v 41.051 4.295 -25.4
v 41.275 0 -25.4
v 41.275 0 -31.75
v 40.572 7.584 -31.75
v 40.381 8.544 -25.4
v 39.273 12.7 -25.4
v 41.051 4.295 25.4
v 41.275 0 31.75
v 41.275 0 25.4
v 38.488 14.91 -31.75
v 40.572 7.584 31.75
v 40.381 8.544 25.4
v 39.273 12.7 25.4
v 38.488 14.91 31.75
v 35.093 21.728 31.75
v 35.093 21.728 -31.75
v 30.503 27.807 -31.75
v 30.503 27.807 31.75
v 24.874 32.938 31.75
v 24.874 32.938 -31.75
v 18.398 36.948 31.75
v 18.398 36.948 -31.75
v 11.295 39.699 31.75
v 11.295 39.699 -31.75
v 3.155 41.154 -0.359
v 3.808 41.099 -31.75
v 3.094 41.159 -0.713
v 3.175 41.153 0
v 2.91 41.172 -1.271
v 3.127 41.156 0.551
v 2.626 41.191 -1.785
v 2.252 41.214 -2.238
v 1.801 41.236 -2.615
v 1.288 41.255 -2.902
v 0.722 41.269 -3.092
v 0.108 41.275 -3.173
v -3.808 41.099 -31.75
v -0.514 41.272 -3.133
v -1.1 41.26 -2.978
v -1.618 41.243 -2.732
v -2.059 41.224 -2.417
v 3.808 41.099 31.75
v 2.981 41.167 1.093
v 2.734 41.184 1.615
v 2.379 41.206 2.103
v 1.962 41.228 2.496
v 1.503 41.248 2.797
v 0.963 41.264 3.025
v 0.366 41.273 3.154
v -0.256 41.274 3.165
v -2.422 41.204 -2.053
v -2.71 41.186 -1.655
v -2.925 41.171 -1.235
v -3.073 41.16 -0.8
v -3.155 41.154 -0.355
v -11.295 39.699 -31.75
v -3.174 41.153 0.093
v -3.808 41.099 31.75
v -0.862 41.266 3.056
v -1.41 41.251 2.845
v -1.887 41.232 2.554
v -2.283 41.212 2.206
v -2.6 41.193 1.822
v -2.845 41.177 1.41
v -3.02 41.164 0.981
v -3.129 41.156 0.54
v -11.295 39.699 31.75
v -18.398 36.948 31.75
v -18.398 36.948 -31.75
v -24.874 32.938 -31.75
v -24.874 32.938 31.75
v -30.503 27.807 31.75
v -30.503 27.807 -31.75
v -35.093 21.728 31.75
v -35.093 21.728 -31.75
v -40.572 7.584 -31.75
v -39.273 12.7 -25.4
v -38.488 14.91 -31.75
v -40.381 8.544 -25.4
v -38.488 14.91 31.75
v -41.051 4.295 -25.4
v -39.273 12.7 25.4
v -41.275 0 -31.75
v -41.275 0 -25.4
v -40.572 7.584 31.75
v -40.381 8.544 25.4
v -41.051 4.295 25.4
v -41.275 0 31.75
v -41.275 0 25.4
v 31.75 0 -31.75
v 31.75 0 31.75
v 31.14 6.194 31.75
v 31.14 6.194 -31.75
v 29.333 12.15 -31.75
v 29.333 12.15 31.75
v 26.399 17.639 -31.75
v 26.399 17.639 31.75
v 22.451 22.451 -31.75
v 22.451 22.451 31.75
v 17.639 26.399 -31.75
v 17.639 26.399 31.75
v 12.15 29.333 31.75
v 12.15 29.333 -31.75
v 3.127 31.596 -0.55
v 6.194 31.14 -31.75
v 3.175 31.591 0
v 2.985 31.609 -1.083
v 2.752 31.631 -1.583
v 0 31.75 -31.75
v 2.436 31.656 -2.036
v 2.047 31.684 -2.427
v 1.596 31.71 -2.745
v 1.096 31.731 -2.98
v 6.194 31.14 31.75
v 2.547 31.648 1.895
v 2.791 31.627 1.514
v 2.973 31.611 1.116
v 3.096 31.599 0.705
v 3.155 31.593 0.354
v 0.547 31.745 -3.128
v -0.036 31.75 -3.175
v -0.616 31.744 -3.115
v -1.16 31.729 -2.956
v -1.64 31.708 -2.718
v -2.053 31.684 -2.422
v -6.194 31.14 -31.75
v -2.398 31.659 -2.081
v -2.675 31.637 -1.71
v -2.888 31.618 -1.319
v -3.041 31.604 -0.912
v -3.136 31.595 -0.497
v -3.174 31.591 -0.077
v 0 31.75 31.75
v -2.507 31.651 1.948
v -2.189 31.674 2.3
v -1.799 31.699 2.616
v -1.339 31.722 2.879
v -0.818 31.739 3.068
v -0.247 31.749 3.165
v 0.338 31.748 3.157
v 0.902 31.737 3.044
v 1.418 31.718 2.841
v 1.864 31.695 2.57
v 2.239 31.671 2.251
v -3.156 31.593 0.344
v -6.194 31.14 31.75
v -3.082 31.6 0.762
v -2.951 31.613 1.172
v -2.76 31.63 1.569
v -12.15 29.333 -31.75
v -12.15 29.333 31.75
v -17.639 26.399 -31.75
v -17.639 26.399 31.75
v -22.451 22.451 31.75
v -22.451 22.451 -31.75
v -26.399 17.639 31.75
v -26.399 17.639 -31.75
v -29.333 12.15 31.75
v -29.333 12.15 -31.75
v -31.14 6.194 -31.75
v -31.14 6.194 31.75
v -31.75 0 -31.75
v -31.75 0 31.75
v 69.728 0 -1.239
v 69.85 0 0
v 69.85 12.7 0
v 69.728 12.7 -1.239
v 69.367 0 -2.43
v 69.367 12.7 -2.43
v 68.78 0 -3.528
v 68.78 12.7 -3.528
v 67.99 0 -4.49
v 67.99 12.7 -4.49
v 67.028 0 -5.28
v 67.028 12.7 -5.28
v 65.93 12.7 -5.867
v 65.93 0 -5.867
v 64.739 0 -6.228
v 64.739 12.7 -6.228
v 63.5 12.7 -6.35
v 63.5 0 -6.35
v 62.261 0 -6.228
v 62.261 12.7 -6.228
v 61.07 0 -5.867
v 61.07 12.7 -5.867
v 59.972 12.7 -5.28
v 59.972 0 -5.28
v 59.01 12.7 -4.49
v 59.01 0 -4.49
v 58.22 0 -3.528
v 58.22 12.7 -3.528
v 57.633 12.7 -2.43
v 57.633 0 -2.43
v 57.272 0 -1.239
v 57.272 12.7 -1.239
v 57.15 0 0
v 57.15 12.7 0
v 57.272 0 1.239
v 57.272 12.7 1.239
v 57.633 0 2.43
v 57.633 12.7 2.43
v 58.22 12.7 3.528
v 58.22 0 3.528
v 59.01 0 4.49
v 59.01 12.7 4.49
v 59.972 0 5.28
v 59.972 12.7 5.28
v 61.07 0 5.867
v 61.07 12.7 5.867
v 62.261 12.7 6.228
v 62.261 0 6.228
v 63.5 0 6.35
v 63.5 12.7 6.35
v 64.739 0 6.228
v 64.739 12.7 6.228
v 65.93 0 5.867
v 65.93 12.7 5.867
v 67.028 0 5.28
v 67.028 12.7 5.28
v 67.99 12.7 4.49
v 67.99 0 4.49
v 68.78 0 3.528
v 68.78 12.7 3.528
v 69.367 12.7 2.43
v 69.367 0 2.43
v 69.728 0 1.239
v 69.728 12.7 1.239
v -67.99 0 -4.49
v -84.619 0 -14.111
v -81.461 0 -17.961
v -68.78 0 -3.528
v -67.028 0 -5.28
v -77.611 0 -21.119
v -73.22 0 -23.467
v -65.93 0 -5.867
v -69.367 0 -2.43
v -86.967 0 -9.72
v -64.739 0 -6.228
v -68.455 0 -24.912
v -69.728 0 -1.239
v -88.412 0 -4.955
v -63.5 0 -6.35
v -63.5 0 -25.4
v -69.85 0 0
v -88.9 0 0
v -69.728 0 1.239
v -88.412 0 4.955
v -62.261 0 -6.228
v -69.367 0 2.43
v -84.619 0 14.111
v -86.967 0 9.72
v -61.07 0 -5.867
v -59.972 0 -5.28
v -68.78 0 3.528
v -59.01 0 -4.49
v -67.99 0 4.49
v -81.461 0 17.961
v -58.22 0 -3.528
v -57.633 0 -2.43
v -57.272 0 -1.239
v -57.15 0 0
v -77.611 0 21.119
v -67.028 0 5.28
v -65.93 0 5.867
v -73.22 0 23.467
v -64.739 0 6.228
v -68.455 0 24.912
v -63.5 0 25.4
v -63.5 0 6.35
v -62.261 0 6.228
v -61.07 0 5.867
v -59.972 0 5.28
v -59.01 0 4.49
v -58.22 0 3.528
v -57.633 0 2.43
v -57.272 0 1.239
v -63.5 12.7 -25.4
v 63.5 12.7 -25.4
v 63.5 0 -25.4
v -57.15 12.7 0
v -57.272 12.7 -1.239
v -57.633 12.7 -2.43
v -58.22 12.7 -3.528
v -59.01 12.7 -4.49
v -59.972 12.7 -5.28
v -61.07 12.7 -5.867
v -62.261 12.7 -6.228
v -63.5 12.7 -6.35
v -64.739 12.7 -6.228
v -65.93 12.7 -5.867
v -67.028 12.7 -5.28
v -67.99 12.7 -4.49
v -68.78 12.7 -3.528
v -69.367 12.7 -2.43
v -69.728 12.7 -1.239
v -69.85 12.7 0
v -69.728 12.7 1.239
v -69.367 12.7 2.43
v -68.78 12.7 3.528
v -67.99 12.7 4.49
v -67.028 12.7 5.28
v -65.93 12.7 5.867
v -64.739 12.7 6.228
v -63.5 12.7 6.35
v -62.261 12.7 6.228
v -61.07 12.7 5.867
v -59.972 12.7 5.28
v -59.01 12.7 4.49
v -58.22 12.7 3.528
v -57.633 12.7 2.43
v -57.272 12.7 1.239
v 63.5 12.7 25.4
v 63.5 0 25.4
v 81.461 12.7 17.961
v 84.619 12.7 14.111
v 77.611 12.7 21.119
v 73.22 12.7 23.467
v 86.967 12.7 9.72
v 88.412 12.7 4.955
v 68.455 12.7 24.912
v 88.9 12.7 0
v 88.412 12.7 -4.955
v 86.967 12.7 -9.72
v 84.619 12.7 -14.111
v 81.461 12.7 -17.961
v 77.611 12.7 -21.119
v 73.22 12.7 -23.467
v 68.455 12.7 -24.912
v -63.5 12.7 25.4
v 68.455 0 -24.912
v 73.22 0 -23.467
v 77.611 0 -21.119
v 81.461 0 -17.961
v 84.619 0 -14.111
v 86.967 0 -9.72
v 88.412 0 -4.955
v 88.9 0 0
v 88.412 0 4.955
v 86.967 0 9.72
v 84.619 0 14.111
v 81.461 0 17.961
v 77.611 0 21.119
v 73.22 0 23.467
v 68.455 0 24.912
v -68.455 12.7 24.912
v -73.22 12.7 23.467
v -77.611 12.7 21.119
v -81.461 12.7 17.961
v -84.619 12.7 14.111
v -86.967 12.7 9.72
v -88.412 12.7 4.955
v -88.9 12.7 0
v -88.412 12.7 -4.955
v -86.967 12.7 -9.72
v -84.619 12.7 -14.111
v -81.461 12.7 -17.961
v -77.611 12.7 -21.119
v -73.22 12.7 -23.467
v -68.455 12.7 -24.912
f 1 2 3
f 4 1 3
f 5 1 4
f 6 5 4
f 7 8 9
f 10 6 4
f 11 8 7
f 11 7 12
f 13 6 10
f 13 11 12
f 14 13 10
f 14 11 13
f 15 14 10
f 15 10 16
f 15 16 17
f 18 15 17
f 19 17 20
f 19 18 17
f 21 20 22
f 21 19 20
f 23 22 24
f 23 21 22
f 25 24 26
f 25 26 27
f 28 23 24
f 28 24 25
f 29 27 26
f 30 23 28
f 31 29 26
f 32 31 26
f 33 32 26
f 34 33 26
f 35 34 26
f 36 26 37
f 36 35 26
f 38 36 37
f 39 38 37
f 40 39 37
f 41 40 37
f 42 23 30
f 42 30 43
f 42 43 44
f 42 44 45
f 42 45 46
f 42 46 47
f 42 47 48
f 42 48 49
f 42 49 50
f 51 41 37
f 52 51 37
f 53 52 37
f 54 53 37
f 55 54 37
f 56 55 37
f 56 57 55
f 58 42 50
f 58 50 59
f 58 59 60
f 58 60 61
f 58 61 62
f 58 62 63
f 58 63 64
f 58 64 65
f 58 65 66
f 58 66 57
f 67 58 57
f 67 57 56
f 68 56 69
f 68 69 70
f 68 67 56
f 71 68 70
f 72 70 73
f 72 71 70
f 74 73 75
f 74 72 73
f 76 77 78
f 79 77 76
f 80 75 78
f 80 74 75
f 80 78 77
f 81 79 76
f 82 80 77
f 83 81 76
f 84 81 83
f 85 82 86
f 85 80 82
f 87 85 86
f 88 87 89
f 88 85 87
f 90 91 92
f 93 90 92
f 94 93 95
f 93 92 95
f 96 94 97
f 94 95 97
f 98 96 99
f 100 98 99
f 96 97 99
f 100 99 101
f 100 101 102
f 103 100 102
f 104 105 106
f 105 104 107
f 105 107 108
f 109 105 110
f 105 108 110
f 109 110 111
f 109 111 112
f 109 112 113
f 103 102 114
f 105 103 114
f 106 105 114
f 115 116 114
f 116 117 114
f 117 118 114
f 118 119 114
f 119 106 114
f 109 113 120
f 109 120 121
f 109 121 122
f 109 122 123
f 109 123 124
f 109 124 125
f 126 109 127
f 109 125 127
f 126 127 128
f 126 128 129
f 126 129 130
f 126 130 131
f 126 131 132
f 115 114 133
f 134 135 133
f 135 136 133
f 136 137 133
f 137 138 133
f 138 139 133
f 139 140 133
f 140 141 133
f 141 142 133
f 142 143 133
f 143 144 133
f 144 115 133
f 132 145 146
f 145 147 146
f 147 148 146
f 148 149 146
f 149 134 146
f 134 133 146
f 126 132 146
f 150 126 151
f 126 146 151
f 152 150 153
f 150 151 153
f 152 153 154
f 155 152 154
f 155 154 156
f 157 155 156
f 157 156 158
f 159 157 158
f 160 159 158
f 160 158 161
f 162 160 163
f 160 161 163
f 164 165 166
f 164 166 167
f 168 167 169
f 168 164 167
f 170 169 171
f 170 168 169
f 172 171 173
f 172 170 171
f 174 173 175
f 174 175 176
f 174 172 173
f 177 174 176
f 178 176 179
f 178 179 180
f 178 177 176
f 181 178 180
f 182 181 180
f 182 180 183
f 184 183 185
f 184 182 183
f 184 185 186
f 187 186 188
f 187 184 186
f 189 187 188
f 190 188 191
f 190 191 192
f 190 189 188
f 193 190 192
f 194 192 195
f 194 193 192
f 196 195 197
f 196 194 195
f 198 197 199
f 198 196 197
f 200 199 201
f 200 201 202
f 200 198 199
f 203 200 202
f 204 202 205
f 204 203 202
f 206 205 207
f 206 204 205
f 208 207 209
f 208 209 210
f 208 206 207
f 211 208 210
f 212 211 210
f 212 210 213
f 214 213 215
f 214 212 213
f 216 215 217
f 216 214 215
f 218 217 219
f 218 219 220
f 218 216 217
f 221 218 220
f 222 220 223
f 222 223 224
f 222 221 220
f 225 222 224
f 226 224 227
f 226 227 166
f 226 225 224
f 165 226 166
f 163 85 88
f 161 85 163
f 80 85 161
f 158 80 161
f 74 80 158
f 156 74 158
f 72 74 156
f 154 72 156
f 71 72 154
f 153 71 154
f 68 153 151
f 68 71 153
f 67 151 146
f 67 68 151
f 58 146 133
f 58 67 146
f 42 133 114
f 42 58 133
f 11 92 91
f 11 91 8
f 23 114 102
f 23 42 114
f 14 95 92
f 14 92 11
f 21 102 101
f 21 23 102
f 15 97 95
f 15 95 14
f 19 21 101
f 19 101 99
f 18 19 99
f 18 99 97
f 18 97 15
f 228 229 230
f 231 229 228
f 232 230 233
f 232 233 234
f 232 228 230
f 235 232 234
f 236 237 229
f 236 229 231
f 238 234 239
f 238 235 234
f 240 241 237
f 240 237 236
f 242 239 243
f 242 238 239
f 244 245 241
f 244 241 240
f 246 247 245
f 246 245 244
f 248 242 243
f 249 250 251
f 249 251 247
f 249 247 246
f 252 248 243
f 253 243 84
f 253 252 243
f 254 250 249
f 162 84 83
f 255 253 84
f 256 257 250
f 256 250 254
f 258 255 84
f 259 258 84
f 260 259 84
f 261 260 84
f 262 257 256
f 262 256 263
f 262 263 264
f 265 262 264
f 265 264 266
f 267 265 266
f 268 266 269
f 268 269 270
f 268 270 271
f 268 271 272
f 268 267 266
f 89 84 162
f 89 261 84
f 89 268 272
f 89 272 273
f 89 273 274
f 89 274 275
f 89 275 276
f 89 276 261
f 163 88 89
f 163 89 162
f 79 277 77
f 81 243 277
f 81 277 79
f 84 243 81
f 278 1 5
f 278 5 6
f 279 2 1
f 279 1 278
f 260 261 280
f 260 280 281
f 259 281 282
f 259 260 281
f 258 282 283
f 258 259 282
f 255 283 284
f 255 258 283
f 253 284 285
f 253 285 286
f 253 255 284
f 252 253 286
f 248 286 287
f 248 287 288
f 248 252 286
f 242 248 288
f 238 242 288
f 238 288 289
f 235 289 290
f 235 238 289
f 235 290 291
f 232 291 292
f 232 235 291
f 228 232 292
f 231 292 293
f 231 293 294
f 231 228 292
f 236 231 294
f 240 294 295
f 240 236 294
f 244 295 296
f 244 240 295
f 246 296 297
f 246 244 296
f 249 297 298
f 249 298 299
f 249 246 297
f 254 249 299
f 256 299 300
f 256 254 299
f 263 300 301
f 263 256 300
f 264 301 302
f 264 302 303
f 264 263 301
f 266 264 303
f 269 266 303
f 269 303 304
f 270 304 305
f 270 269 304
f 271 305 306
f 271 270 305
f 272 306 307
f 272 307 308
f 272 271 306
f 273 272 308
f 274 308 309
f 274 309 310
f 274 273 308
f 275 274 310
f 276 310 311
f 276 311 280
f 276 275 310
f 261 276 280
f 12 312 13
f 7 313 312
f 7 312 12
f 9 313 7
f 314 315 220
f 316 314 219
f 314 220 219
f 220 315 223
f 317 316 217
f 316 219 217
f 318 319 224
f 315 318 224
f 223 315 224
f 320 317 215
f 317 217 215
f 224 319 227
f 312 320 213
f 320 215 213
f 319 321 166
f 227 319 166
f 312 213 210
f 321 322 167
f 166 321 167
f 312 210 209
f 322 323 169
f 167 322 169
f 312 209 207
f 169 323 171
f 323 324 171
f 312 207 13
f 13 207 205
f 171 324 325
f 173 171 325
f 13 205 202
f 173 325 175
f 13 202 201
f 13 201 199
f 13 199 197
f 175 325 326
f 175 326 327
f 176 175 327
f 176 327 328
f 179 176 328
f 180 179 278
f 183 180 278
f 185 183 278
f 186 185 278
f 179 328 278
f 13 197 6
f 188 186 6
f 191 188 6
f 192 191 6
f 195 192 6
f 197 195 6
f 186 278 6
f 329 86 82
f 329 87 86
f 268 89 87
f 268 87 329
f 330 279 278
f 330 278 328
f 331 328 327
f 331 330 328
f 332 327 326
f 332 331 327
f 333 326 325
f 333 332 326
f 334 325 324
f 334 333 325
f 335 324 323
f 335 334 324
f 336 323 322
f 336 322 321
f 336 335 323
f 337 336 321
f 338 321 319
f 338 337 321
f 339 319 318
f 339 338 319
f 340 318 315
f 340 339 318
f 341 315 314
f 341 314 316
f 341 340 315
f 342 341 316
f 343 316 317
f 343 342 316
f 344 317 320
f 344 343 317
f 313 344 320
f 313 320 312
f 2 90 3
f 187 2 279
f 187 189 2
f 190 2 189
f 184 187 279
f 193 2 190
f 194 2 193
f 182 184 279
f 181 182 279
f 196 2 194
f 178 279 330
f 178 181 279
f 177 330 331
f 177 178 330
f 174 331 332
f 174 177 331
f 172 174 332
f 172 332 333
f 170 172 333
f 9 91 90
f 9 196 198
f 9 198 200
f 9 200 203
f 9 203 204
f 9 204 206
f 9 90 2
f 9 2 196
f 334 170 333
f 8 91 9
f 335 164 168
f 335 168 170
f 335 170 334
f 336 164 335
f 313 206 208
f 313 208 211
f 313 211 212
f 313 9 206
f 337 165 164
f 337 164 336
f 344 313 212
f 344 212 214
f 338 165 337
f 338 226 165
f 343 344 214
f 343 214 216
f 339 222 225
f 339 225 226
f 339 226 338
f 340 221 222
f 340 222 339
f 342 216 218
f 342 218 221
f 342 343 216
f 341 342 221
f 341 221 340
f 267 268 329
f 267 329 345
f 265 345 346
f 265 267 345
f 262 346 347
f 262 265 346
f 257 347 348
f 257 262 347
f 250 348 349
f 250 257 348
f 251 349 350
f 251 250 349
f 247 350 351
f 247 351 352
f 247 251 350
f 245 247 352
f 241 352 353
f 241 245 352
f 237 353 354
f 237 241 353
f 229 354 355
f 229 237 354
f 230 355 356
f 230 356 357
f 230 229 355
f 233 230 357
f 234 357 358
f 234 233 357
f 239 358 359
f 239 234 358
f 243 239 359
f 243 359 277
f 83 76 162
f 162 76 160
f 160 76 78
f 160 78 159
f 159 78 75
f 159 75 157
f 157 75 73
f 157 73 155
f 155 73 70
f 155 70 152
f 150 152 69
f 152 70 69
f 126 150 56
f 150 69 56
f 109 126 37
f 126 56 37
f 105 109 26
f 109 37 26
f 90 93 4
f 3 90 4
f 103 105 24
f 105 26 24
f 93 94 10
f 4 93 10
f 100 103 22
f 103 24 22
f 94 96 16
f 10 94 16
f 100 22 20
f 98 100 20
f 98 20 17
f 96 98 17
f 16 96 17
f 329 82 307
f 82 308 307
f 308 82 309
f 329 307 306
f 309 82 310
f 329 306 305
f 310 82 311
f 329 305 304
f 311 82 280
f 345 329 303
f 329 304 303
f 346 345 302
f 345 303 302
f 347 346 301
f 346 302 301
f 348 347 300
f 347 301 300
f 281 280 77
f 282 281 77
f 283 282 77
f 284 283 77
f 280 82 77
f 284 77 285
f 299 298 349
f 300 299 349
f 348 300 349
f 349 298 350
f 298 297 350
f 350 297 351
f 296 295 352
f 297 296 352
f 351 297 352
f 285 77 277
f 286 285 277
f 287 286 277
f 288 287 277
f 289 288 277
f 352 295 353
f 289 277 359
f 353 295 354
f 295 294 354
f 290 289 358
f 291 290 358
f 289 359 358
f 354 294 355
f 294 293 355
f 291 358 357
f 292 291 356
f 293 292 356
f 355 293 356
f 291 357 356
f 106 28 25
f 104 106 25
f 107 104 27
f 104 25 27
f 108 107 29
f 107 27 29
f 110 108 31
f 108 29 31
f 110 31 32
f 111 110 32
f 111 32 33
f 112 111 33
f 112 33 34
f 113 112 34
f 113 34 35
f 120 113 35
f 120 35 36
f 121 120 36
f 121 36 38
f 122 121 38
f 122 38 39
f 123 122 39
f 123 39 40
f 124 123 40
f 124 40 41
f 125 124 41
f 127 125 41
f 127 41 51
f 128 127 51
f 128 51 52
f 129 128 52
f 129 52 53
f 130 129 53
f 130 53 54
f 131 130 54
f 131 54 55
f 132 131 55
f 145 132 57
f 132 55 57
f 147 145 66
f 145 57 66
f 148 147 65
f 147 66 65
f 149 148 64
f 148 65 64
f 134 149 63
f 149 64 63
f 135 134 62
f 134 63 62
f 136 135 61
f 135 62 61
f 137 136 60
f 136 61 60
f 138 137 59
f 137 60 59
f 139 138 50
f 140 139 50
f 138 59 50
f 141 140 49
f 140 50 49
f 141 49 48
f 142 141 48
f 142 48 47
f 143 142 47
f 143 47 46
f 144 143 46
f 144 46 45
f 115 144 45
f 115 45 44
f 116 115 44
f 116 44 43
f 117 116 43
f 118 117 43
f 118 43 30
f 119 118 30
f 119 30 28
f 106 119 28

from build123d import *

# Parameters (mm, degrees)
SKETCH5_R           = 6.35
BOSS_EXTRUDE2_DEPTH = 12.7
BOSS_EXTRUDE3_DEPTH = 31.75
CUT_EXTRUDE1_DEPTH  = 63.5
SKETCH10_R          = 3.175
CUT_EXTRUDE2_DEPTH  = 63.5


with BuildPart() as part:
    # Sketch5 → Boss-Extrude2 (new body)
    with BuildSketch(Plane(origin=(0, 0, 0), x_dir=(1, 0, 0), z_dir=(0, 1, 0))):
        with BuildLine():
            Line((-63.5, 25.4), (63.5, 25.4))
            ThreePointArc((63.5, 25.4), (88.9, 0), (63.5, -25.4))
            Line((63.5, -25.4), (-63.5, -25.4))
            ThreePointArc((-63.5, -25.4), (-88.9, 0), (-63.5, 25.4))
        make_face()
        with Locations((-63.5, 0)):
            Circle(SKETCH5_R, mode=Mode.SUBTRACT)
        with Locations((63.5, 0)):
            Circle(SKETCH5_R, mode=Mode.SUBTRACT)
    extrude(amount=BOSS_EXTRUDE2_DEPTH)

    # Sketch6 → Boss-Extrude3 (add, symmetric)
    with BuildSketch(Plane.XY):
        with BuildLine():
            Line((-41.275, 0), (41.275, 0))
            ThreePointArc((41.275, 0), (0, 41.275), (-41.275, 0))
        make_face()
    extrude(amount=BOSS_EXTRUDE3_DEPTH, both=True)

    # Sketch7 → Cut-Extrude1 (cut)
    with BuildSketch(Plane.XY.offset(31.75)):
        with BuildLine():
            Line((-31.75, 0), (31.75, 0))
            ThreePointArc((31.75, 0), (0, 31.75), (-31.75, 0))
        make_face()
    extrude(amount=-CUT_EXTRUDE1_DEPTH, mode=Mode.SUBTRACT)

    # Sketch10 → Cut-Extrude2 (cut)
    with BuildSketch(Plane(origin=(0, 41.275, 0), x_dir=(1, 0, 0), z_dir=(0, 1, 0))):
        Circle(SKETCH10_R)
    extrude(amount=-CUT_EXTRUDE2_DEPTH, mode=Mode.SUBTRACT)


solid = part.part
